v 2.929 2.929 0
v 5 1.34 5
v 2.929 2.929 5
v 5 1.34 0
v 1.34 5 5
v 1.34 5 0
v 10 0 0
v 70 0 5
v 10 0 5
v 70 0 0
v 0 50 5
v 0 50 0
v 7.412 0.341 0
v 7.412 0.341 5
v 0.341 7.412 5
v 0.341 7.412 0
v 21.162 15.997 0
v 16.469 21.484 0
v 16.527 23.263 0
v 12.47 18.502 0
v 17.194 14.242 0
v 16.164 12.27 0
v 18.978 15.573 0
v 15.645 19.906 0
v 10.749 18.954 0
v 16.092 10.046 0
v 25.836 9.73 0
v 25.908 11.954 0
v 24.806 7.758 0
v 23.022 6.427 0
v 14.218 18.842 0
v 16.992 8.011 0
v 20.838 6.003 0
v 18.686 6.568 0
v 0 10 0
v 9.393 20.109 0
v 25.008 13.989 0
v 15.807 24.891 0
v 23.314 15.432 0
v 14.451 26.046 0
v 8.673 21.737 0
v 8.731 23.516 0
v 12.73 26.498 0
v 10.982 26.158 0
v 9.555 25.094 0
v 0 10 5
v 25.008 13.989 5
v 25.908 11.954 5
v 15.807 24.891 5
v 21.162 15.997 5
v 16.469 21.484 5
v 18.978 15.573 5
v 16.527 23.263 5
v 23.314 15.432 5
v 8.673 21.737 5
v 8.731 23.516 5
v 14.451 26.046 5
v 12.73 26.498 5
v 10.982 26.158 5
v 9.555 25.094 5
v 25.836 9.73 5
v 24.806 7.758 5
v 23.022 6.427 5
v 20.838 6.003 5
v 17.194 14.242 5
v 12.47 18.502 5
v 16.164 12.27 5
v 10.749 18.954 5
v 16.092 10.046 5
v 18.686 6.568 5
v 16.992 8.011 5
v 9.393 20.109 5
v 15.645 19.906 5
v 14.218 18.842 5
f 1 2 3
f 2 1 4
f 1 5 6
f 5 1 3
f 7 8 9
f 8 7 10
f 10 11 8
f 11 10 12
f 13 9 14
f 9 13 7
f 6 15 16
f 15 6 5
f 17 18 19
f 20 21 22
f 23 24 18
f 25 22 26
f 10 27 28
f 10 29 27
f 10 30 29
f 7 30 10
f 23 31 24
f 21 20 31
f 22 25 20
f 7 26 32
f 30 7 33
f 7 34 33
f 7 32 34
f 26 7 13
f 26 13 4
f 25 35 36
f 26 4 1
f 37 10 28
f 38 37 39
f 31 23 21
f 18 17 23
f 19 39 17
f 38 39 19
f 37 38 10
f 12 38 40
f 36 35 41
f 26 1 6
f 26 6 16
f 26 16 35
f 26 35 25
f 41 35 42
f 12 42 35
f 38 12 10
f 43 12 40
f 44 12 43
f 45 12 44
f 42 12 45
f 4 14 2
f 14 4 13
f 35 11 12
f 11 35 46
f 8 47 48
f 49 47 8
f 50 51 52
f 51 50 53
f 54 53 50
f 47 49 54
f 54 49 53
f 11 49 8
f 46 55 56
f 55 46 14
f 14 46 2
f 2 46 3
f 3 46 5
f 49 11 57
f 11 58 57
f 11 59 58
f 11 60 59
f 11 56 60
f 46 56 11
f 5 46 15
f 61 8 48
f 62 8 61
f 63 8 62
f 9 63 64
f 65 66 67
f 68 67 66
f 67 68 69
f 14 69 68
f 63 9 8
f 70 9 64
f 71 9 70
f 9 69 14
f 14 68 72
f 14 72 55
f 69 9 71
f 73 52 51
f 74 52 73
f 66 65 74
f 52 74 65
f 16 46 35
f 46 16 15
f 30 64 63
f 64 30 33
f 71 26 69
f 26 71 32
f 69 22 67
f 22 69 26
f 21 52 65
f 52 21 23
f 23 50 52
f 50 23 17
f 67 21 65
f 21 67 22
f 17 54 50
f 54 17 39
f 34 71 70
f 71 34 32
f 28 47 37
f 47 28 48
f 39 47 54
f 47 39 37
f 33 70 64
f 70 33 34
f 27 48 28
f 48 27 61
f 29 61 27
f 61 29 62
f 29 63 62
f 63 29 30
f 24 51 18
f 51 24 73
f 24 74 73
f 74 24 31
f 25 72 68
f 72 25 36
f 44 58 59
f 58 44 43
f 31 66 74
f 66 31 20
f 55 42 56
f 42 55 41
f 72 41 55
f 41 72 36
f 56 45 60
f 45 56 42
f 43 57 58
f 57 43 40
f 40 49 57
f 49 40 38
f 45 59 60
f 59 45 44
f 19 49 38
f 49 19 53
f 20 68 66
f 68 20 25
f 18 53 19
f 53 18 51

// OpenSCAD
$fn = 32;

// ----------------------------------------------------------------------
// Bracket plate: corner pad 70 x 50, fillet R10
// ----------------------------------------------------------------------

// --- parameters (mm) ---
hole_r = 4;               // bolt hole radius
plate_t = 5;              // plate thickness, Z (extrusion height)
leg_a = 70;               // base leg
leg_b = 50;               // height leg
fillet_r = 10;            // right-angle fillet radius

hole_d1 = 2 * hole_r + 2;
hole_d2 = 2 * hole_r;

profile = [[10, 0], [70, 0], [0, 50], [0, 10], [0.341, 7.412], [1.34, 5], [2.929, 2.929], [5, 1.34], [7.412, 0.341]];  // primary outline, 9 points, counter clockwise
void_1 = [[25.908, 11.954], [25.008, 13.989], [23.314, 15.432], [21.162, 15.997], [18.978, 15.573], [17.194, 14.242], [16.164, 12.27], [16.092, 10.046], [16.992, 8.011], [18.686, 6.568], [20.838, 6.003], [23.022, 6.427], [24.806, 7.758], [25.836, 9.73]];  // mount hole 1, 14 points
void_2 = [[16.527, 23.263], [15.807, 24.891], [14.451, 26.046], [12.73, 26.498], [10.982, 26.158], [9.555, 25.094], [8.731, 23.516], [8.673, 21.737], [9.393, 20.109], [10.749, 18.954], [12.47, 18.502], [14.218, 18.842], [15.645, 19.906], [16.469, 21.484]];  // mount hole 2, 14 points

// --- the one profile operation ---
difference() {
  linear_extrude(height = plate_t) polygon(points = profile);
  translate([0, 0, -1])
    linear_extrude(height = plate_t + 2) polygon(points = void_1);
  translate([0, 0, -1])
    linear_extrude(height = plate_t + 2) polygon(points = void_2);
}
